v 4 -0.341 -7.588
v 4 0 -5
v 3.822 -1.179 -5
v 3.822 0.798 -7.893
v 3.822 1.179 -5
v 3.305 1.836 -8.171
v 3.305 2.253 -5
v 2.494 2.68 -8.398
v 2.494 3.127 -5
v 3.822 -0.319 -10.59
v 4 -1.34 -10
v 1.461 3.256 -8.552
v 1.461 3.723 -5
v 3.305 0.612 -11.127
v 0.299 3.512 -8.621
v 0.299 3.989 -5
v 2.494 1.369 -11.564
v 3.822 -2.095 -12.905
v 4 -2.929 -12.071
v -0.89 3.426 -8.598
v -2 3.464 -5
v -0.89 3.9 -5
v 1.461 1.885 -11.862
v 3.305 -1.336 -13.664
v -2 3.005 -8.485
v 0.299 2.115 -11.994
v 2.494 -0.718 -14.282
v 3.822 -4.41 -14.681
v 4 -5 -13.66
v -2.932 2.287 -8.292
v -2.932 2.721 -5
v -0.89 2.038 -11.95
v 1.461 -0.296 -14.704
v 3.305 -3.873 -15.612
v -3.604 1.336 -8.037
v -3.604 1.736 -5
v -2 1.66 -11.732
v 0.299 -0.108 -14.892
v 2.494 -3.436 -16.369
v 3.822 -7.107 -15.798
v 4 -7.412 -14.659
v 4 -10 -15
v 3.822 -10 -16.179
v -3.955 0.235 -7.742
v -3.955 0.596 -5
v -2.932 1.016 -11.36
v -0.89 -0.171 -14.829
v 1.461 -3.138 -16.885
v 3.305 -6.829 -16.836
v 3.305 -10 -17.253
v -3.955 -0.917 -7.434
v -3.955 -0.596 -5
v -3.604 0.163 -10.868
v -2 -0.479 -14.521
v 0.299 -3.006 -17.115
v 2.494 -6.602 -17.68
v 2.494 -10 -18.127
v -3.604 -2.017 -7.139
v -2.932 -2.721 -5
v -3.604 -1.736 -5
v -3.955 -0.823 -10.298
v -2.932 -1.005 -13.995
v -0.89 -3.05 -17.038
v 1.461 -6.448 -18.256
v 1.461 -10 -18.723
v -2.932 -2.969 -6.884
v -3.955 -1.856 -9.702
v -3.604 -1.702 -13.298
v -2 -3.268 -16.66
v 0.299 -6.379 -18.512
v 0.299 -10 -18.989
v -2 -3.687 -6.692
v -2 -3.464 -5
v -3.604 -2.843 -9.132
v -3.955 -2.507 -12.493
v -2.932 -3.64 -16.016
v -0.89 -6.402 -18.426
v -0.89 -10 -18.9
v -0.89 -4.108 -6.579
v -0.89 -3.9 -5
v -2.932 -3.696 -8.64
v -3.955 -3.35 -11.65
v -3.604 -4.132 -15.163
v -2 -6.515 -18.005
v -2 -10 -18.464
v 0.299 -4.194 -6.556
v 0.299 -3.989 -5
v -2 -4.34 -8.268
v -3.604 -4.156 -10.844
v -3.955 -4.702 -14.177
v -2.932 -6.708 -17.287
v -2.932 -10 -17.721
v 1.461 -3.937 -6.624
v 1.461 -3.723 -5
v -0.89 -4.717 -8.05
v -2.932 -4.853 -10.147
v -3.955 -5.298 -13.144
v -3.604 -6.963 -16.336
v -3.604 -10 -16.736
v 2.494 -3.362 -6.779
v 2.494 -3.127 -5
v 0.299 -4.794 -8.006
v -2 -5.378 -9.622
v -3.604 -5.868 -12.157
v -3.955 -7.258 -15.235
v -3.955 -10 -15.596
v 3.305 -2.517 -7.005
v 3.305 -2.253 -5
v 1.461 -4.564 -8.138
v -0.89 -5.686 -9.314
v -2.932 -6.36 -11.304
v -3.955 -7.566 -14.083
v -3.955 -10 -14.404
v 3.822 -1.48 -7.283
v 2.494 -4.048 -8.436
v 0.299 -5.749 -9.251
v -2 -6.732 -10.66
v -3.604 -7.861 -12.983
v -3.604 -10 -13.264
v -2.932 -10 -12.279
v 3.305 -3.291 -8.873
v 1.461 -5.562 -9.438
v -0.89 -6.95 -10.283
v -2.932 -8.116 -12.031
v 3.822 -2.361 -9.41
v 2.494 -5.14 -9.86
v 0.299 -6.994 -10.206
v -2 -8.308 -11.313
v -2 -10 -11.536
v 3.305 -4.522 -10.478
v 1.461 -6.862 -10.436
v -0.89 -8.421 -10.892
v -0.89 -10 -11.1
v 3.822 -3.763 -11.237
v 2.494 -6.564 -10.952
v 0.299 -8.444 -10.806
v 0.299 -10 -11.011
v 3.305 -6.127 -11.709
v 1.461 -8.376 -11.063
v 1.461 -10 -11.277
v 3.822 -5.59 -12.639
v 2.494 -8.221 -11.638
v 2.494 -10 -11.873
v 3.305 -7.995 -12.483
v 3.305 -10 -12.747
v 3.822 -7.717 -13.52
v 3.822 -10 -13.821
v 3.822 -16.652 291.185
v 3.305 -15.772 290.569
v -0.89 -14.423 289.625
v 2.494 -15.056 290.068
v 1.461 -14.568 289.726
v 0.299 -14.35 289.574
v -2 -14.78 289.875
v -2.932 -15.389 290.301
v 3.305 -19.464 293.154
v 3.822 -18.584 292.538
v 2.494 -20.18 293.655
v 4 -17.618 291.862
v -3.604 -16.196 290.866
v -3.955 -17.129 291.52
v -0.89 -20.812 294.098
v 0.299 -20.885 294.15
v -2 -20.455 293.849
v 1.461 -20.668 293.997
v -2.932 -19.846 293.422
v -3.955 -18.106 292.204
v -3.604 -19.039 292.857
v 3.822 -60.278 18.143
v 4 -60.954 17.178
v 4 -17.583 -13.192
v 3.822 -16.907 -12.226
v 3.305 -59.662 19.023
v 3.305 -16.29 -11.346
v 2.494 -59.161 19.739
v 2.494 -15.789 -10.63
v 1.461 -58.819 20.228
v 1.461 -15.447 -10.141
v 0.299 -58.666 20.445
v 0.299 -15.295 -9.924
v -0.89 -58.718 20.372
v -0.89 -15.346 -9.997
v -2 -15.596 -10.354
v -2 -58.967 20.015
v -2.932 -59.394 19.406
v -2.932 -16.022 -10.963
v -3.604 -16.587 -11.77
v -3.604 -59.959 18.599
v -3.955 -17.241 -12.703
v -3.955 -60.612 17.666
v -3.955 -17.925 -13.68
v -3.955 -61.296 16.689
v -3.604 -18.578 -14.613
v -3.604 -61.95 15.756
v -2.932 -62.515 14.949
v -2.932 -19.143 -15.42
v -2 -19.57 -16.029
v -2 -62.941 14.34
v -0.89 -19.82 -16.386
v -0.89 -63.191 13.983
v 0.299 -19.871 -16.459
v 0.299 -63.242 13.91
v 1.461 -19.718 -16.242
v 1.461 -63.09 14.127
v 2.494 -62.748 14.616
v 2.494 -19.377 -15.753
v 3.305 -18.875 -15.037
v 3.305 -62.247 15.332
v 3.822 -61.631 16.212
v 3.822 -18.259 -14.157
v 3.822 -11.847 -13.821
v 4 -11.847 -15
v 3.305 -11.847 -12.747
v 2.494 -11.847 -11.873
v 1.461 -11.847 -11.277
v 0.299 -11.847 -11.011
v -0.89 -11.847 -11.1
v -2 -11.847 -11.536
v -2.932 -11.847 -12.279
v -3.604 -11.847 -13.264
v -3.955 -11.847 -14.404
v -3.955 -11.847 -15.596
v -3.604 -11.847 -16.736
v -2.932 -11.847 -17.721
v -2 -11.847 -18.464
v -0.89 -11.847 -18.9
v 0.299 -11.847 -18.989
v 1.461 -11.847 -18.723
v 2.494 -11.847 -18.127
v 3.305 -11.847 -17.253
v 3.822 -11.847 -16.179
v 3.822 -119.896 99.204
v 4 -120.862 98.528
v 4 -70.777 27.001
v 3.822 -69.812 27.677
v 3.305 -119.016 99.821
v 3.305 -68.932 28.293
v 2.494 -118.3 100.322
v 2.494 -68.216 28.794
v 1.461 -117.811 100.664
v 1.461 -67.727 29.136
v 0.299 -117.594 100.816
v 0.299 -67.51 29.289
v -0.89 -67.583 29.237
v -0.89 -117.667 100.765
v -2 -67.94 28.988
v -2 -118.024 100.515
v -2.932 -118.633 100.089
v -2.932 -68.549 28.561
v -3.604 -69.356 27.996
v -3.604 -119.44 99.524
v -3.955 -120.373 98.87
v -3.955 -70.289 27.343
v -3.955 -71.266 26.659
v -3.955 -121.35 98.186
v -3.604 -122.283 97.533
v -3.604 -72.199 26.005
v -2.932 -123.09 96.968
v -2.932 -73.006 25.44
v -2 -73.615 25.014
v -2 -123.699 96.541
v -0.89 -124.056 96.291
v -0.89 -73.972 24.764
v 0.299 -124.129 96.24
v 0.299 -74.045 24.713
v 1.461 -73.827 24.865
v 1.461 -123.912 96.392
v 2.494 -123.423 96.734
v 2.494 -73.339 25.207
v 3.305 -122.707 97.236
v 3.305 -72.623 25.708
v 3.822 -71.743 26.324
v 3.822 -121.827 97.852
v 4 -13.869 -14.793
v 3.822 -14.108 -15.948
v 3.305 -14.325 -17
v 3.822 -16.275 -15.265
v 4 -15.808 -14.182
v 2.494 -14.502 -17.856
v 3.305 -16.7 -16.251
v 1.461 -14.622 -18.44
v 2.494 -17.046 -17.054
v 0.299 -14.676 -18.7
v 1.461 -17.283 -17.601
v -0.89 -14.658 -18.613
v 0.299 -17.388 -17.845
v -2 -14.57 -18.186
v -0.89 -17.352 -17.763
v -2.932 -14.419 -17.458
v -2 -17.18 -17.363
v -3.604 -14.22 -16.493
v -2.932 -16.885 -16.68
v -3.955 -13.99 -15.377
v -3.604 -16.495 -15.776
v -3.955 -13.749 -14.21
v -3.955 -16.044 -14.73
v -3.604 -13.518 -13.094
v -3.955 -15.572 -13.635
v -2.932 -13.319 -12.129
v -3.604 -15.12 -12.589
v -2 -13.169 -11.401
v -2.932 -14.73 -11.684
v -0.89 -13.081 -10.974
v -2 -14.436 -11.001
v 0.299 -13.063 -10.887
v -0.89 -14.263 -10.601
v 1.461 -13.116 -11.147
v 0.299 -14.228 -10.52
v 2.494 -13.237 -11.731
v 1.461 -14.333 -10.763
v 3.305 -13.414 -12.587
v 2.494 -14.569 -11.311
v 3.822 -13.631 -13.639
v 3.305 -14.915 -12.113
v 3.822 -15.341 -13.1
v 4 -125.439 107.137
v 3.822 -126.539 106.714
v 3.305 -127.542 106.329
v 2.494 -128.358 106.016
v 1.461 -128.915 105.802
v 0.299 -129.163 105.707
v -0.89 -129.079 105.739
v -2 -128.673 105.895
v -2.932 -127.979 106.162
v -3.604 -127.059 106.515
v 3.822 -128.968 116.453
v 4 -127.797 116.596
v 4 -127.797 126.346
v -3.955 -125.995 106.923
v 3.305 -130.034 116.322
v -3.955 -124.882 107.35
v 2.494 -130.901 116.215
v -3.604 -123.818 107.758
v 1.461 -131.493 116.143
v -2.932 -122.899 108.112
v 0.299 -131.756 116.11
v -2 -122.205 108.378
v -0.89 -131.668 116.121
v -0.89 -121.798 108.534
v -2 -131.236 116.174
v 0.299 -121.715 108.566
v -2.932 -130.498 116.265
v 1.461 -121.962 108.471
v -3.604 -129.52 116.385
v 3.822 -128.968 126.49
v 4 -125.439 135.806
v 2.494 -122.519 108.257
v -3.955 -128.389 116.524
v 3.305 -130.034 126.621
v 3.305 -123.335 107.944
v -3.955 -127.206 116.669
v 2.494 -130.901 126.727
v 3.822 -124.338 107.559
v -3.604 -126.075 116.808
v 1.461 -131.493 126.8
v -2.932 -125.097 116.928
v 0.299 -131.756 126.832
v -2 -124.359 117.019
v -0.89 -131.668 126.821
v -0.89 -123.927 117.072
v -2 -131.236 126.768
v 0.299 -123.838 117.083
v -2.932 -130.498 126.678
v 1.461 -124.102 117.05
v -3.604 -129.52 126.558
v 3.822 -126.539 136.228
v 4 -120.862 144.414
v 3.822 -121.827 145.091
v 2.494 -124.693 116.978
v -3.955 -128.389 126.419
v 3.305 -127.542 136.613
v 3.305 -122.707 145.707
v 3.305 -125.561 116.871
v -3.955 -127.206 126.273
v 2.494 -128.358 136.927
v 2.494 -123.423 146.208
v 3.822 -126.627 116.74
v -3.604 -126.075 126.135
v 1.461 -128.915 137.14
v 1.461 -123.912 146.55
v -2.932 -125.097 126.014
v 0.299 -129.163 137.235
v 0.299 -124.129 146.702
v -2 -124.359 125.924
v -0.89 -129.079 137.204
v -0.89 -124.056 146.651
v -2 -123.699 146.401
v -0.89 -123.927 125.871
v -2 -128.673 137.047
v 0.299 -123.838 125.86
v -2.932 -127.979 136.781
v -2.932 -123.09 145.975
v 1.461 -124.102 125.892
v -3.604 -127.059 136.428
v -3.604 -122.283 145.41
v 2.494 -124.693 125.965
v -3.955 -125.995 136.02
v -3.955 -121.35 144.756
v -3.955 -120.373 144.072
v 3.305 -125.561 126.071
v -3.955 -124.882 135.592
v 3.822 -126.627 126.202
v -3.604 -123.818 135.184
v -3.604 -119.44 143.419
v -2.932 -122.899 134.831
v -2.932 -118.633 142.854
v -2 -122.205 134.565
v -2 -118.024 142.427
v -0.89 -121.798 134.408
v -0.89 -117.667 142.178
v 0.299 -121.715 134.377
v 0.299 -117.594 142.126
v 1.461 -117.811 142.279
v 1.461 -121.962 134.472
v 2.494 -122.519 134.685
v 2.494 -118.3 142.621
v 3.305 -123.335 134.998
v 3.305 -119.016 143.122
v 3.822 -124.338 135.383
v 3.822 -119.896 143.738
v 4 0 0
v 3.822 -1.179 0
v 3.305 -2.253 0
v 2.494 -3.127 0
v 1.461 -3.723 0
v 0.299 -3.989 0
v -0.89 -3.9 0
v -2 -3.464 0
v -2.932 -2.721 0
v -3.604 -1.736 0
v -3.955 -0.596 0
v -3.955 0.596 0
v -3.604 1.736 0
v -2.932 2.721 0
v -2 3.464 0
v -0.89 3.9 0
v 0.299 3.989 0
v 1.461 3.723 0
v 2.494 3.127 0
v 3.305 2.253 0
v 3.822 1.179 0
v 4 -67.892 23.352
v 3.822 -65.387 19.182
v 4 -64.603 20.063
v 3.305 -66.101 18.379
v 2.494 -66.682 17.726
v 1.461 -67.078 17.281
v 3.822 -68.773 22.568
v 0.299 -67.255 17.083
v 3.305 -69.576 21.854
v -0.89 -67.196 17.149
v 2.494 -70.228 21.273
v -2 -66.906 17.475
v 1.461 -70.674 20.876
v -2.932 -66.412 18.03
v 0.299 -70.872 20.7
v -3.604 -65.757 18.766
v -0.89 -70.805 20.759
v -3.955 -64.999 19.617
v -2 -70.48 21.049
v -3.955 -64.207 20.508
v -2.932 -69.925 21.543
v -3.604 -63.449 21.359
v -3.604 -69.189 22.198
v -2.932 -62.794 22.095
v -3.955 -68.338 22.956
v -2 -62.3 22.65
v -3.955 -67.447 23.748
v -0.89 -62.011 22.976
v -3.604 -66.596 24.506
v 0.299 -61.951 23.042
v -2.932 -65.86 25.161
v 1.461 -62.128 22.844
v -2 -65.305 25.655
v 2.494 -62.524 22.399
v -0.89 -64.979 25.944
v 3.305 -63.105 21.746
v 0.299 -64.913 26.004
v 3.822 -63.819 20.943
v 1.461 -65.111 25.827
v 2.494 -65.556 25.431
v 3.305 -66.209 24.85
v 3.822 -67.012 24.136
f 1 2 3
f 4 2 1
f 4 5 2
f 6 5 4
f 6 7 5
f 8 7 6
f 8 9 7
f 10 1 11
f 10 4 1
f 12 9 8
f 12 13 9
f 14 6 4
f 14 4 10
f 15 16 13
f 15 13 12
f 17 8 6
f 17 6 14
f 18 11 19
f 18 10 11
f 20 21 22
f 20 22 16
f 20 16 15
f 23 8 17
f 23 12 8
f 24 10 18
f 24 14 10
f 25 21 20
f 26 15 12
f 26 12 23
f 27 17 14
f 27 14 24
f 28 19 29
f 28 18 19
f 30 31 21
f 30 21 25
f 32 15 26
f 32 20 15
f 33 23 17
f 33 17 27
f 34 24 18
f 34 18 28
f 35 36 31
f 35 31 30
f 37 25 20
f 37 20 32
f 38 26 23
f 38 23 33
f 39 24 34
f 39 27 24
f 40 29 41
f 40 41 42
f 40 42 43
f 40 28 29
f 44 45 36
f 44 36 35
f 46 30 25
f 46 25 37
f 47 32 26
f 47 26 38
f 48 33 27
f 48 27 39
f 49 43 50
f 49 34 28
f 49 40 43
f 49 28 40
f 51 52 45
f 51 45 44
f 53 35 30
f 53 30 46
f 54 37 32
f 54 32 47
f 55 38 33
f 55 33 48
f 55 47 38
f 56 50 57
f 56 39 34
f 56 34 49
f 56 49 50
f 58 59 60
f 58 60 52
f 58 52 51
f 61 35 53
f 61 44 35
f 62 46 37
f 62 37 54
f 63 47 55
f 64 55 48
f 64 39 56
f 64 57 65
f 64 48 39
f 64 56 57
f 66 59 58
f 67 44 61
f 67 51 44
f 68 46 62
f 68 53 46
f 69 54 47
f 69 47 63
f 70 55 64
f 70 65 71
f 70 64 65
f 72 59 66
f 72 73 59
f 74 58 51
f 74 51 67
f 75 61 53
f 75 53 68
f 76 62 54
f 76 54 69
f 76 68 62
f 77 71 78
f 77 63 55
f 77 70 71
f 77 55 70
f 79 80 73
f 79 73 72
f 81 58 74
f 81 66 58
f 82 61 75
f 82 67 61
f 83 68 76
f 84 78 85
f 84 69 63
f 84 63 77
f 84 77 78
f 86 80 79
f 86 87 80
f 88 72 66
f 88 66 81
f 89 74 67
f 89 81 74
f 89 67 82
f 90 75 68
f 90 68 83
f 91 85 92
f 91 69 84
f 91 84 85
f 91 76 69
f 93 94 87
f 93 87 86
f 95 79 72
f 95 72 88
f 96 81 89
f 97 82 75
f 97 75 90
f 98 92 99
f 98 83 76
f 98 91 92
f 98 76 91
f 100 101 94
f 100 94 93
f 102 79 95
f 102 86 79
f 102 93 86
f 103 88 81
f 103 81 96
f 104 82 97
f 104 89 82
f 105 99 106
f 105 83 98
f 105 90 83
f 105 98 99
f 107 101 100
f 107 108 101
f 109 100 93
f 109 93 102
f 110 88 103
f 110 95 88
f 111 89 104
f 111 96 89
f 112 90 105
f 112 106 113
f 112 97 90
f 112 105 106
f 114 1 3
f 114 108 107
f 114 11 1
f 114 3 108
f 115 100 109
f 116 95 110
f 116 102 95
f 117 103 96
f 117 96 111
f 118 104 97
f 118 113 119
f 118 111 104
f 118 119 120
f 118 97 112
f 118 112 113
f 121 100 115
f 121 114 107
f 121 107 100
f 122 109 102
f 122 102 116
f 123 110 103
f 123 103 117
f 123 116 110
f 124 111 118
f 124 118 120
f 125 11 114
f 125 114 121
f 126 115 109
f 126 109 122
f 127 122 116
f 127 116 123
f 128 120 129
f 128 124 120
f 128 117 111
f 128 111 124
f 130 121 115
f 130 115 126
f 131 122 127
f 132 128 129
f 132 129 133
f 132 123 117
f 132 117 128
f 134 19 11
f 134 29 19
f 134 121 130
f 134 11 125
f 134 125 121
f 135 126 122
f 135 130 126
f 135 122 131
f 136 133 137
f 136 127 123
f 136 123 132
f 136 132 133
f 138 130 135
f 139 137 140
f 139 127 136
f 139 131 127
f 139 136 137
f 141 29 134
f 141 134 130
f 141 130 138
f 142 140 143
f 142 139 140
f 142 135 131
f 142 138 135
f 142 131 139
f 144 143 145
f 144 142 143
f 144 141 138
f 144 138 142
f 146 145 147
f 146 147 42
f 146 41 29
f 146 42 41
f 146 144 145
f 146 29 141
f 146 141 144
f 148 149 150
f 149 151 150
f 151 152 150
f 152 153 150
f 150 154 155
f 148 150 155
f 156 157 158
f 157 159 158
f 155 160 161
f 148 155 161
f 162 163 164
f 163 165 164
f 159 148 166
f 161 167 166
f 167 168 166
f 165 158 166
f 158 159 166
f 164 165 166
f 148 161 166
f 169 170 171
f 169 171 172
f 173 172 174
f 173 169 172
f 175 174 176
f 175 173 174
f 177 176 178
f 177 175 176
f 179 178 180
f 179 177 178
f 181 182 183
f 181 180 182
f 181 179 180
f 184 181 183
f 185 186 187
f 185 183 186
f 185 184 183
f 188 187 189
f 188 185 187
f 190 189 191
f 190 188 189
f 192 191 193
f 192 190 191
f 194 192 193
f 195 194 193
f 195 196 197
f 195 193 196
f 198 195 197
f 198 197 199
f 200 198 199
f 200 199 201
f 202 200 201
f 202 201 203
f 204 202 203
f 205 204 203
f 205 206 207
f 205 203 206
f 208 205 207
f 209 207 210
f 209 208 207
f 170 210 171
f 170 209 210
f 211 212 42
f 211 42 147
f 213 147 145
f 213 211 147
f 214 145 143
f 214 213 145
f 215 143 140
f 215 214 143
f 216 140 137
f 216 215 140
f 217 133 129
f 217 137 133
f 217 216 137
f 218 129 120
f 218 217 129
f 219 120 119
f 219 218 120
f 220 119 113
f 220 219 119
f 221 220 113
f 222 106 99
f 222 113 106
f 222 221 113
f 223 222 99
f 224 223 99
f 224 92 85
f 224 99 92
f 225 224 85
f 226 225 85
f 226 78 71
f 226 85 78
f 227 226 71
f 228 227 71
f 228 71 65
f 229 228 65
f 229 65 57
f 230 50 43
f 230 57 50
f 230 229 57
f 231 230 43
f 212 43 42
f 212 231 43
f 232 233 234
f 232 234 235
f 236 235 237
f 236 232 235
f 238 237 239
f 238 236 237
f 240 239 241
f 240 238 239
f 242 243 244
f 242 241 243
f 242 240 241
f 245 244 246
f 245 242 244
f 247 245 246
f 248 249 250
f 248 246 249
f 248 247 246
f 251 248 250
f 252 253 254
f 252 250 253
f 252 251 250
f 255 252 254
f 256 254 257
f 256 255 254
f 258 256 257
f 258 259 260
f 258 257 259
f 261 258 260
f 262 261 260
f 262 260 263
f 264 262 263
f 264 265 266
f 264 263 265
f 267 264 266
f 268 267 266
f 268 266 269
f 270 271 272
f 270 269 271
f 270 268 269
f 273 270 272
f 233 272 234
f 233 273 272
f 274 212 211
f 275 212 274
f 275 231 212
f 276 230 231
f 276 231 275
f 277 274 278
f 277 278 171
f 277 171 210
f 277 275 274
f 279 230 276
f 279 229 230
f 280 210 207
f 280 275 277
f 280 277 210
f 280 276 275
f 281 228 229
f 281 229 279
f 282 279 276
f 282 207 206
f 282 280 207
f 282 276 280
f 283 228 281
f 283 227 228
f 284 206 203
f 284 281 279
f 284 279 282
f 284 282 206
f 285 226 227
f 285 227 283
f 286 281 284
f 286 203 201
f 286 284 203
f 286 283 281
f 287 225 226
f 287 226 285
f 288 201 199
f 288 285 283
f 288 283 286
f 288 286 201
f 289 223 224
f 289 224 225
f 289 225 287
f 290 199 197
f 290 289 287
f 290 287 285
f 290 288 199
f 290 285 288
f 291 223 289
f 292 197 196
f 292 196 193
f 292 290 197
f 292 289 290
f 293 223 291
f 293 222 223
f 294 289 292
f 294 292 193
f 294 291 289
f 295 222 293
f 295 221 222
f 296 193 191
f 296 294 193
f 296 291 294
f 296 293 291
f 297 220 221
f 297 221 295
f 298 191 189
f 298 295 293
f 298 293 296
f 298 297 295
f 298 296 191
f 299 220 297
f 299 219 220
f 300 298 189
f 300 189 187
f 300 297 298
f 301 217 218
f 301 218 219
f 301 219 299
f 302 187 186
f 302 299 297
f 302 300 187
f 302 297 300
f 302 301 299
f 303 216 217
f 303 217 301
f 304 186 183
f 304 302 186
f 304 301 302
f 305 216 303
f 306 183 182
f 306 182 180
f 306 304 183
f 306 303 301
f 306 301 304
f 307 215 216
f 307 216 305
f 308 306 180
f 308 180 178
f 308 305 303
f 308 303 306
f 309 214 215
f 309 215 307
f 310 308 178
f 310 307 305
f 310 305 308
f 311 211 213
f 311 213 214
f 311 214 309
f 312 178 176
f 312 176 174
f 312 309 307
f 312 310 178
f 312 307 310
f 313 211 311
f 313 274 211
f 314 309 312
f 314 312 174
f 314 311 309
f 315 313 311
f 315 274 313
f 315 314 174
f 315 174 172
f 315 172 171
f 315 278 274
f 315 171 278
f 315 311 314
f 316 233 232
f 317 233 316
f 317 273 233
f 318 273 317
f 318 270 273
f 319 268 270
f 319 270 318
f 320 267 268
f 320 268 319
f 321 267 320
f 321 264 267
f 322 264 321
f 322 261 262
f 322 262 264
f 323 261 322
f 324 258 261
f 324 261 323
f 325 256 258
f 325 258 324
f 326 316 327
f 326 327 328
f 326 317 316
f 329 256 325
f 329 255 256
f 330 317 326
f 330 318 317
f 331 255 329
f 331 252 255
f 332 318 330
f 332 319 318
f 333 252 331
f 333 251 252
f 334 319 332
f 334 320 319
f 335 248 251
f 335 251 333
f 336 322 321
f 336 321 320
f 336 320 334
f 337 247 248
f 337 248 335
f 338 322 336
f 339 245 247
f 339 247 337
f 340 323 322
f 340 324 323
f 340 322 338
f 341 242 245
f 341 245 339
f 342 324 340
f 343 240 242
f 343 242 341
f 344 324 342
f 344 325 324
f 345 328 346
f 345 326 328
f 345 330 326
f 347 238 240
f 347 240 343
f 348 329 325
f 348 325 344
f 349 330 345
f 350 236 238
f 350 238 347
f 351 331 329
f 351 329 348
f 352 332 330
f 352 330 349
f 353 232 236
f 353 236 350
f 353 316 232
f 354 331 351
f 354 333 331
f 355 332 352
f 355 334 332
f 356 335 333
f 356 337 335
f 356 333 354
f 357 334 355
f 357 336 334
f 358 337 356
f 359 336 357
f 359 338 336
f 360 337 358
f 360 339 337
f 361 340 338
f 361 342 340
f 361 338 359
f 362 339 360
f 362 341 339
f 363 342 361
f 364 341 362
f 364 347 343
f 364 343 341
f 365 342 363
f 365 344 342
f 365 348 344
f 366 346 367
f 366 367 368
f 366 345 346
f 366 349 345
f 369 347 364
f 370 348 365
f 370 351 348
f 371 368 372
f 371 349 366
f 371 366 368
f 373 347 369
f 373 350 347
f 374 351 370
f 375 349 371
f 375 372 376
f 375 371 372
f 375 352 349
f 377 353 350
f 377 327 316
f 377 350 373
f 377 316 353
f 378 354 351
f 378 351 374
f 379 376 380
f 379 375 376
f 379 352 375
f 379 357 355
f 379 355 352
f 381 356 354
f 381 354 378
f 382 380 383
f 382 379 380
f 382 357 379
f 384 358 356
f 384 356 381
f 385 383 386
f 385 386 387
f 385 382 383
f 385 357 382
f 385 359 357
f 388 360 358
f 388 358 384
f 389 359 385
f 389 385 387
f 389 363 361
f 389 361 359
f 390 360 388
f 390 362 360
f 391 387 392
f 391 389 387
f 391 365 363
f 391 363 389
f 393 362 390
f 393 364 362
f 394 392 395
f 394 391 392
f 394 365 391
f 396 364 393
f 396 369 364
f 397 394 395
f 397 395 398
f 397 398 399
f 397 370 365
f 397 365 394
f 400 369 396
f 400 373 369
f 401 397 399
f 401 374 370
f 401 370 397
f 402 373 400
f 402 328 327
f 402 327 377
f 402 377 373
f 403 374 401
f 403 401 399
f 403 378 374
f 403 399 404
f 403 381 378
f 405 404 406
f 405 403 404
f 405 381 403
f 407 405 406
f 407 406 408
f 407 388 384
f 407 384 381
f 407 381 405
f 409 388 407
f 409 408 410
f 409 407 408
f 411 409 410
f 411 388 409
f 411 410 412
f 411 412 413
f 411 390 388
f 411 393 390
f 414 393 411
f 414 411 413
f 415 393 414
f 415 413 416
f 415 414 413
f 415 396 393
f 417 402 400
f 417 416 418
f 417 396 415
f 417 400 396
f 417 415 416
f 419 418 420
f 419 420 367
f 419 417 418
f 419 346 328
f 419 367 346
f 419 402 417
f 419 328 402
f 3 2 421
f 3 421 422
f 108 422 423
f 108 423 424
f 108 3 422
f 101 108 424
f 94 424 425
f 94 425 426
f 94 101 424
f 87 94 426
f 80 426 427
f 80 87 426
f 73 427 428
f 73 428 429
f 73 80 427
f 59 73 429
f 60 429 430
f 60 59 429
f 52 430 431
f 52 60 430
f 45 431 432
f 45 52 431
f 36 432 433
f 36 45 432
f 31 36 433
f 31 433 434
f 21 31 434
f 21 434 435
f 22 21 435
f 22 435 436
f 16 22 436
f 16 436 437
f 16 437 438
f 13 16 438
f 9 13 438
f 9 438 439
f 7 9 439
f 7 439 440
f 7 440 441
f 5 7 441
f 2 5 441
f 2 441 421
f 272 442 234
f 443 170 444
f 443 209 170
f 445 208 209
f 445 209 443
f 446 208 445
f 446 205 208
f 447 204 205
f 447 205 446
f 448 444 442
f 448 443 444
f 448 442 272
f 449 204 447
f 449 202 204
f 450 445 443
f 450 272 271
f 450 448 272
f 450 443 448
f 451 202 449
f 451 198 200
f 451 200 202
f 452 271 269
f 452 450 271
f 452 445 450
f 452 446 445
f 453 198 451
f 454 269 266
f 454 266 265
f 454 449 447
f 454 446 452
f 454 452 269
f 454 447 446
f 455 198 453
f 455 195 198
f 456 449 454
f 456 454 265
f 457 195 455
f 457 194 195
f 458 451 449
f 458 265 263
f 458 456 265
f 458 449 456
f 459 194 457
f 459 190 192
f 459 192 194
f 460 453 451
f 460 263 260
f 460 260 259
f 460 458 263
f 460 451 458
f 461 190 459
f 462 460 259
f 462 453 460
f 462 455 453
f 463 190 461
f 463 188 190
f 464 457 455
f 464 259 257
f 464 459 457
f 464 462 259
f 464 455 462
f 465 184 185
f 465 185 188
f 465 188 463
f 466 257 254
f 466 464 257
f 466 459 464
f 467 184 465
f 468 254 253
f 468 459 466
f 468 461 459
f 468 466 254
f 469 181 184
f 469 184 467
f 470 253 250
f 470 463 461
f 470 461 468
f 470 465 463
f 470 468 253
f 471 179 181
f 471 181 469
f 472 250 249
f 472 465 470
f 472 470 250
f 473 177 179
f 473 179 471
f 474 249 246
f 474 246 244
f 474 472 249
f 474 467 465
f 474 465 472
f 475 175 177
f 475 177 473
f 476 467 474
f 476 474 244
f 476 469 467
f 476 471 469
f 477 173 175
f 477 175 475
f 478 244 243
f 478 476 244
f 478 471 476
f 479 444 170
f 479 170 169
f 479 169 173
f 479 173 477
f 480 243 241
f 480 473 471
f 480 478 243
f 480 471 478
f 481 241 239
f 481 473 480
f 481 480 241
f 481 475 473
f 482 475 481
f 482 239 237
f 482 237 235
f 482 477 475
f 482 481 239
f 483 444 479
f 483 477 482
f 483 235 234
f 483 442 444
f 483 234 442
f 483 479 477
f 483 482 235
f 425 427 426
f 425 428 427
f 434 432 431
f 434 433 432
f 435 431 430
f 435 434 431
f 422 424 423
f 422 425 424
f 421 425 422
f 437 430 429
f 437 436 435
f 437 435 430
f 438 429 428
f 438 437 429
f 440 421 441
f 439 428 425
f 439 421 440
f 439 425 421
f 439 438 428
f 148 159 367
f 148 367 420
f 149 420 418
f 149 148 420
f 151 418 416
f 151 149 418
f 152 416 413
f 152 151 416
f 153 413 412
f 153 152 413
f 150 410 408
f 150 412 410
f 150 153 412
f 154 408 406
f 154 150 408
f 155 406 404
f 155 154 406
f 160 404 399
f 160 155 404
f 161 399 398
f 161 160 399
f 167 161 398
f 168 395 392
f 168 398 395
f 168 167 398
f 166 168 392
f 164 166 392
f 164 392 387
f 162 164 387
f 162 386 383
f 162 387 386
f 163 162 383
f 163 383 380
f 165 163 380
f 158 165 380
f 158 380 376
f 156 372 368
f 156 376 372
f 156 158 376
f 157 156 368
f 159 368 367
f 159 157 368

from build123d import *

# Parameters (mm, degrees)
SKETCH_1_R = 4


with BuildPart() as part:
    # 扫描1: sweep along a path in 草图2
    with BuildLine(Plane(origin=(0, 0, 0), x_dir=(0, 0, -1), z_dir=(1, 0, 0))) as sweep_1_path:
        Line((0, 0), (5, 0))
        ThreePointArc((5, 0), (12.071067812, -2.928932188), (15, -10))
        Line((15, -10), (15, -11.847012111))
        ThreePointArc((15, -11.847012111), (14.537169507, -14.854070106), (13.191520443, -17.582776475))
        Line((13.191520443, -17.582776475), (-17.177585689, -60.954354864))
        ThreePointArc((-17.177585689, -60.954354864), (-21.659396213, -66.295568657), (-27.000610007, -70.777379181))
        Line((-27.000610007, -70.777379181), (-98.528199032, -120.861536207))
        ThreePointArc((-98.528199032, -120.861536207), (-121.471256486, -128.095454435), (-144.41431394, -120.861536207))
        Line((-144.41431394, -120.861536207), (-291.861681912, -17.617777664))
    # 草图1 → 扫描1 (sweep)
    with BuildSketch(Plane.XY):
        Circle(SKETCH_1_R)
    sweep(path=sweep_1_path.line)


solid = part.part
